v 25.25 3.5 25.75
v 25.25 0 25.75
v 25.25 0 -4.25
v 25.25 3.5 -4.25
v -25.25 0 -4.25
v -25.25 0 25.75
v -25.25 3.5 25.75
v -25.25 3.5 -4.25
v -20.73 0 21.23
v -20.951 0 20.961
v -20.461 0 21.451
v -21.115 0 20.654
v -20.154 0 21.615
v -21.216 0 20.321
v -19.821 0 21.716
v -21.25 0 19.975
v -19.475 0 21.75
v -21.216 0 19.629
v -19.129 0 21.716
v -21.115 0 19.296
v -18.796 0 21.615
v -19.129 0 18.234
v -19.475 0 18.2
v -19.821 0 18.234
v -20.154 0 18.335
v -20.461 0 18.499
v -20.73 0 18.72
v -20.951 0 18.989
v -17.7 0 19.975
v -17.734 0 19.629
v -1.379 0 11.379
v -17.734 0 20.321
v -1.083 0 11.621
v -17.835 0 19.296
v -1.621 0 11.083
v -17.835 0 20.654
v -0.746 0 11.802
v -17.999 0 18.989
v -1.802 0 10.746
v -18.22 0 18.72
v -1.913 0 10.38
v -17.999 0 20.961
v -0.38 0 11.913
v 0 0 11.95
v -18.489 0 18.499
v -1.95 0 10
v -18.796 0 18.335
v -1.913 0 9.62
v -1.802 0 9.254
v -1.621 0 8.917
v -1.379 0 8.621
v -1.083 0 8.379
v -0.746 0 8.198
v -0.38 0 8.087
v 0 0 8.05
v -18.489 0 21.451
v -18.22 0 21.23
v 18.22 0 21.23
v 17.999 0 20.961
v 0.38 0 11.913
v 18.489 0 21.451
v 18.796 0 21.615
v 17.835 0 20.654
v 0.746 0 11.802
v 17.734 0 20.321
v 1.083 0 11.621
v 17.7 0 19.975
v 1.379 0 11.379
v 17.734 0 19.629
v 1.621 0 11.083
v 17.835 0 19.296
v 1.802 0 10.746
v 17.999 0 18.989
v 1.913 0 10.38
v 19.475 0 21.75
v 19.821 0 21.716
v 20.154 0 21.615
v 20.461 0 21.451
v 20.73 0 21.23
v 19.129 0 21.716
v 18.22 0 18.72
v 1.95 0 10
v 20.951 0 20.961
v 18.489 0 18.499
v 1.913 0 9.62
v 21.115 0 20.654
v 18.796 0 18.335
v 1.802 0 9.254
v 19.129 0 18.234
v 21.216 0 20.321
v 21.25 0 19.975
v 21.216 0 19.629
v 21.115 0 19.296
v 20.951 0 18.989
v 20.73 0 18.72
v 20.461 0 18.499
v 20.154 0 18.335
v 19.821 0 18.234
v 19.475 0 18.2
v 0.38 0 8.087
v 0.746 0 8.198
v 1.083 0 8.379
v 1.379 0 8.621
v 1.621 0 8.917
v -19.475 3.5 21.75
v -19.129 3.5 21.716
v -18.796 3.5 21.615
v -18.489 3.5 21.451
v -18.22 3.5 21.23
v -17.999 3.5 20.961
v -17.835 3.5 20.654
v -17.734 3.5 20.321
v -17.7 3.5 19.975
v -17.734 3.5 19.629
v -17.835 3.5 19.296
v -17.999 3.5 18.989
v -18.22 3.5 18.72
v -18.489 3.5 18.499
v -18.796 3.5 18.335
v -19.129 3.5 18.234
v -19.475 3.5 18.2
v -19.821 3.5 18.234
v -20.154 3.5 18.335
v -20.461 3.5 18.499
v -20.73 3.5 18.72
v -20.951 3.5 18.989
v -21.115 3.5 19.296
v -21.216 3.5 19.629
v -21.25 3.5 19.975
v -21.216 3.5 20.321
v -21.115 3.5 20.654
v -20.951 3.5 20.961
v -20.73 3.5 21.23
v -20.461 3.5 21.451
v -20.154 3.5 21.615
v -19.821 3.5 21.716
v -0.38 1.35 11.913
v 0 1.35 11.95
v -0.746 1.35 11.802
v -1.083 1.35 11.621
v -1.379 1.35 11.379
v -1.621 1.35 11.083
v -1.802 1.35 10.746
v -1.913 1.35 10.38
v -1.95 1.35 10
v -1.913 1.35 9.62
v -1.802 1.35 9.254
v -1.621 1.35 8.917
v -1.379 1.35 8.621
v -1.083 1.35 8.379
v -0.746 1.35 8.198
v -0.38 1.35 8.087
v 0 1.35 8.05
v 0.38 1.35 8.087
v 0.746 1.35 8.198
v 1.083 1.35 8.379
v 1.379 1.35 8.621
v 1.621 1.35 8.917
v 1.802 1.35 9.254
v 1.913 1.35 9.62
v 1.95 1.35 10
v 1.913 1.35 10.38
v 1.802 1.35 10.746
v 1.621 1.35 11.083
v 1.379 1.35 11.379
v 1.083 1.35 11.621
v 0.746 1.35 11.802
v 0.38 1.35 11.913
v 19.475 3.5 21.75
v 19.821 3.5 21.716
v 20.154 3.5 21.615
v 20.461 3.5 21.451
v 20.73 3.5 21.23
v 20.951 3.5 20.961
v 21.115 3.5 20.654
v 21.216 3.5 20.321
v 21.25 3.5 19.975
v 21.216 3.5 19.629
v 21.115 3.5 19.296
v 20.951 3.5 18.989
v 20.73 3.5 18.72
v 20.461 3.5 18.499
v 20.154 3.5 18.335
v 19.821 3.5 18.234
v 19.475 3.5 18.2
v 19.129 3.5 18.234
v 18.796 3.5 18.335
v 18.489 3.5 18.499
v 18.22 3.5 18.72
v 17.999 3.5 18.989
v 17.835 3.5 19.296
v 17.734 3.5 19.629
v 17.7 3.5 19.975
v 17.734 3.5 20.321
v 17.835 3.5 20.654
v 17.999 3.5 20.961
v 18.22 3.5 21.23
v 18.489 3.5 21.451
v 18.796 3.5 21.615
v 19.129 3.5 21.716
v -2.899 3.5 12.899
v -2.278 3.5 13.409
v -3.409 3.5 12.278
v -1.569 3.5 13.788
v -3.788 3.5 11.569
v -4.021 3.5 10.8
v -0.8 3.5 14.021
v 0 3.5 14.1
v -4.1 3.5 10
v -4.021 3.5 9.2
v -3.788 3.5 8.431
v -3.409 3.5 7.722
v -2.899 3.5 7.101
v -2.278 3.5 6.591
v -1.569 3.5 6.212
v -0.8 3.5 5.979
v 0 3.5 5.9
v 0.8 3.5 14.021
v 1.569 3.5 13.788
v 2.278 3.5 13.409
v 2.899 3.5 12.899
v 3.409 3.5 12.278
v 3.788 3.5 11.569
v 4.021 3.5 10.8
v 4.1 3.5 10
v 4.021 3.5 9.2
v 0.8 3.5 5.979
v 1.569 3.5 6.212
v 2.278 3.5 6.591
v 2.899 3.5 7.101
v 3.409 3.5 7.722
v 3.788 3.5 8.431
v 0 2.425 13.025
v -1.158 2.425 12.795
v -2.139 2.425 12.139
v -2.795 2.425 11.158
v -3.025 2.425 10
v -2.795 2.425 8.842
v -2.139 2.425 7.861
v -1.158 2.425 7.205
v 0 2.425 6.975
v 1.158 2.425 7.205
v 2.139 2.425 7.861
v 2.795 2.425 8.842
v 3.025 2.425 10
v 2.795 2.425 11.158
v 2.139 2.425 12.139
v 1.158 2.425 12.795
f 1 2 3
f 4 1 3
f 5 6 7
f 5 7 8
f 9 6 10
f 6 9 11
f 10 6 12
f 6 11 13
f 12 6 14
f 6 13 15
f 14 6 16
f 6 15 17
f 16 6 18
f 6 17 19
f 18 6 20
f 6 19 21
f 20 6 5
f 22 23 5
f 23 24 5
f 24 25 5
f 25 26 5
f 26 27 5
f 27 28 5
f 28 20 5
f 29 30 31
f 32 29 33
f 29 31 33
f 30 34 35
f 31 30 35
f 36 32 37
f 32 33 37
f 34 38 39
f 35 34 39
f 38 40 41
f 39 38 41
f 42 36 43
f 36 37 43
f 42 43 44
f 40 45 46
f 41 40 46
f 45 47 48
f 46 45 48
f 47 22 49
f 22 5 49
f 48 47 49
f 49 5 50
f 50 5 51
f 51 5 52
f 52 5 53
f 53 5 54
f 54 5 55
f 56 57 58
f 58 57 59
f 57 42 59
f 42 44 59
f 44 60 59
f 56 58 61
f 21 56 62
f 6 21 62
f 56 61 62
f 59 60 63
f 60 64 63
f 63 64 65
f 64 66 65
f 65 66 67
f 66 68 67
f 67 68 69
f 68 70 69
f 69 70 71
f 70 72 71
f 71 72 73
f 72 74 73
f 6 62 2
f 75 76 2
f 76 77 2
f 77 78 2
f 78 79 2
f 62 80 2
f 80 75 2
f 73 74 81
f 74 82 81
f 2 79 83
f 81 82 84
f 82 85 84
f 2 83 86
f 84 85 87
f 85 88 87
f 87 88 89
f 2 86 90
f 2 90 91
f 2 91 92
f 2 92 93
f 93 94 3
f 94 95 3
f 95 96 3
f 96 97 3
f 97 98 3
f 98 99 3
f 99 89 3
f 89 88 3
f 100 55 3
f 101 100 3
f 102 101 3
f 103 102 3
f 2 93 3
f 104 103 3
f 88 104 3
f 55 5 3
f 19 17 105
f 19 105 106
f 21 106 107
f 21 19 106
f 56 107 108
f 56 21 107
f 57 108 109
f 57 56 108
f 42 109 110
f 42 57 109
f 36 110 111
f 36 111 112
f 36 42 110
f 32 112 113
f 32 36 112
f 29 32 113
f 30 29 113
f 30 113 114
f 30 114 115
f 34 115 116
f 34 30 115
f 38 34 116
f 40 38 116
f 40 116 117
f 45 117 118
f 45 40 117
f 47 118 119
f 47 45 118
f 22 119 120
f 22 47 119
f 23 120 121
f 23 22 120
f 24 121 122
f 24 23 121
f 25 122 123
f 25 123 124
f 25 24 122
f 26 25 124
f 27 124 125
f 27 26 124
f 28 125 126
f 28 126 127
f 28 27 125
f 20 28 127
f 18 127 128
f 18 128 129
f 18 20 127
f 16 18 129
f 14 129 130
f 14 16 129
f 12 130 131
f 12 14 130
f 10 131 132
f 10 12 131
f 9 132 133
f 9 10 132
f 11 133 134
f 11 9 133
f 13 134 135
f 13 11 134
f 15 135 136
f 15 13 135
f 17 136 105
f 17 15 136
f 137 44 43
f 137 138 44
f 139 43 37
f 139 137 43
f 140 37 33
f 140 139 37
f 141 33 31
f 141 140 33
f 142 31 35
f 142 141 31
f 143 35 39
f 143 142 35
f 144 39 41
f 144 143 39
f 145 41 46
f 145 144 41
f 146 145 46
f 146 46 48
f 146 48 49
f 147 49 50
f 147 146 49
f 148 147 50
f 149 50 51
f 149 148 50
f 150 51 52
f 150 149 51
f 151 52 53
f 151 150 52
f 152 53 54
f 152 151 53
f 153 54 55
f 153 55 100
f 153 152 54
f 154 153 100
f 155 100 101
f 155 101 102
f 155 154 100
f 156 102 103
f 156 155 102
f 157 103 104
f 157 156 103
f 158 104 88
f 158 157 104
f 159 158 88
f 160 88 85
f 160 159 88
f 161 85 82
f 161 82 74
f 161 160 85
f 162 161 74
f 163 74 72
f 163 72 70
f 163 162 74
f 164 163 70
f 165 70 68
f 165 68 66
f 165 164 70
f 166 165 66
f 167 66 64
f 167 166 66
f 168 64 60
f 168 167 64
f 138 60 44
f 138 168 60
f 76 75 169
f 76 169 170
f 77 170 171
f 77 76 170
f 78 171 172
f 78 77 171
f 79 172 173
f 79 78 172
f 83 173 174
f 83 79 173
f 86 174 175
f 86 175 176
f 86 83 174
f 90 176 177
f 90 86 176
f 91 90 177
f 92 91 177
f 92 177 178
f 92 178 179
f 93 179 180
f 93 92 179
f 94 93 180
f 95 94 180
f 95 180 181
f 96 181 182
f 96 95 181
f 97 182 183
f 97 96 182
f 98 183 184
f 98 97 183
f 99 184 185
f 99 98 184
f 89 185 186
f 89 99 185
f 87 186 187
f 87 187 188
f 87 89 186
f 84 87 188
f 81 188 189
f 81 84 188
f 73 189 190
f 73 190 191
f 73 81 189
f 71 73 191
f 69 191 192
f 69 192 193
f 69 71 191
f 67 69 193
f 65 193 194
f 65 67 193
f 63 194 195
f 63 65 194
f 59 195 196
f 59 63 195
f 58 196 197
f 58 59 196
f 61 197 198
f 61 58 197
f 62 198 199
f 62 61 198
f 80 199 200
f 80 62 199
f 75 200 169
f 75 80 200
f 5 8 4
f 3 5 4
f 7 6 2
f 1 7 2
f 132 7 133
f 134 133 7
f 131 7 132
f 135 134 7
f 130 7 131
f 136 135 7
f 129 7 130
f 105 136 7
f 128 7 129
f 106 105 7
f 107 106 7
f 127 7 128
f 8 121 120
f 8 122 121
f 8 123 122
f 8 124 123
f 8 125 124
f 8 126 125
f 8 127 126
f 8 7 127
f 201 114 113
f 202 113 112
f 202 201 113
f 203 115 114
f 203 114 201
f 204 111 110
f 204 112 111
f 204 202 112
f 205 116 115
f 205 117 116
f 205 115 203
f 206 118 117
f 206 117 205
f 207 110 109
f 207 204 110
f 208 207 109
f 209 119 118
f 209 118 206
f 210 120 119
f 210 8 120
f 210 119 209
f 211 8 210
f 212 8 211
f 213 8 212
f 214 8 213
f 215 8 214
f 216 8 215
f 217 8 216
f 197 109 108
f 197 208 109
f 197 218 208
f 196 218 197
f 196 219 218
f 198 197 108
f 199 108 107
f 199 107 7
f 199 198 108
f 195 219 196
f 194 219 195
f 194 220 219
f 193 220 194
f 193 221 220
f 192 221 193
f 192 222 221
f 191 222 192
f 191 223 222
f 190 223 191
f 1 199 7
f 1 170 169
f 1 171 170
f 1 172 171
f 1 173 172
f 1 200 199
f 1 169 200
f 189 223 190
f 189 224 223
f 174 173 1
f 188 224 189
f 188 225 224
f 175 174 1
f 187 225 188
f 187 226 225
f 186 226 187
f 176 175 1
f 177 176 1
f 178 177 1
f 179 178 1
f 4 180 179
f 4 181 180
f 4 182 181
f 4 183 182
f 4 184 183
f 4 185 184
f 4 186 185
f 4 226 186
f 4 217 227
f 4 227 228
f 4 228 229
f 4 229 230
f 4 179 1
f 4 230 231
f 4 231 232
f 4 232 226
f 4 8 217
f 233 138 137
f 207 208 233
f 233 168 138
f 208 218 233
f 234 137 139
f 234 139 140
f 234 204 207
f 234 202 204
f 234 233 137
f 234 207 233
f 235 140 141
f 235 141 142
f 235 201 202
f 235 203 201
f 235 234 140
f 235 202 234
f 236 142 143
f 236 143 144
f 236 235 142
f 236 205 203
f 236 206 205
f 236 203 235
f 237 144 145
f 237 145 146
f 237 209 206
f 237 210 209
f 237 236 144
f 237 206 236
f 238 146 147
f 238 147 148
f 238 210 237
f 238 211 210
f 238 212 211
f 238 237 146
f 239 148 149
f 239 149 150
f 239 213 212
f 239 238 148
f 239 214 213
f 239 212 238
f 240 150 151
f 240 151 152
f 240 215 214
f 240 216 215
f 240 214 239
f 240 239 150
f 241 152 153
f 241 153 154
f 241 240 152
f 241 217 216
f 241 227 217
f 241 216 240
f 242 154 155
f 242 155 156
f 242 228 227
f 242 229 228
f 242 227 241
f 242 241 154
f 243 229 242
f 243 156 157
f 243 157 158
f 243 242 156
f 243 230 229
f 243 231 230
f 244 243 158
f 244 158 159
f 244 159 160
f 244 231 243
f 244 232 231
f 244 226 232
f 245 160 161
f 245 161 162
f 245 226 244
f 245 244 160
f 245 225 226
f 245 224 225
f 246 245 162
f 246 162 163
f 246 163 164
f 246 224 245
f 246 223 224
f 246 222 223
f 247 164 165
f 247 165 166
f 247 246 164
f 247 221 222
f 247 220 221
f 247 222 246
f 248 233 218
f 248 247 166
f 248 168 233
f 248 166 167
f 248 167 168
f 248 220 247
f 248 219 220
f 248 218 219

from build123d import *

# Parameters (mm, degrees)
SKETCH1_W                                      = 50.5
SKETCH1_H                                      = 51.5
SKETCH1_R                                      = 1.775
BOSS_EXTRUDE1_DEPTH                            = 3.5
CSK_FOR_M3_5_FLAT_HEAD_MACHINE_SCREW1_AT_COUNT = 2
CSK_FOR_M3_5_FLAT_HEAD_MACHINE_SCREW1_AT_PITCH = 20


with BuildPart() as part:
    # Sketch1 → Boss-Extrude1 (new body)
    with BuildSketch(Plane(origin=(0, 0, 0), x_dir=(1, 0, 0), z_dir=(0, 1, 0))):
        Rectangle(SKETCH1_W, SKETCH1_H)
        with Locations(Location((-19.475, 19.975, 0), (0, 0, 270))):
            Circle(SKETCH1_R, mode=Mode.SUBTRACT)
        with Locations(Location((19.475, 19.975, 0), (0, 0, 270))):
            Circle(SKETCH1_R, mode=Mode.SUBTRACT)
        with Locations(Location((19.475, -19.975, 0), (0, 0, 270))):
            Circle(SKETCH1_R, mode=Mode.SUBTRACT)
        with Locations(Location((-19.475, -19.975, 0), (0, 0, 270))):
            Circle(SKETCH1_R, mode=Mode.SUBTRACT)
    extrude(amount=BOSS_EXTRUDE1_DEPTH)

    # Sketch4 → CSK for M3.5 Flat Head Machine Screw1 (revolve, cut)
    with BuildSketch(Plane(origin=(0, 3.5, -10), x_dir=(0, 0, 1), z_dir=(1, 0, 0))):
        Polygon((0, 0), (0, 3.5), (1.95, 3.5), (1.95, 2.15), (4.1, 0), align=None)
    csk_for_m3_5_flat_head_machine_screw1 = revolve(axis=Axis((0, 9.85, -10), (0, -1, 0)), mode=Mode.SUBTRACT)

    # CSK for M3.5 Flat Head Machine Screw1 at: CSK for M3.5 Flat Head Machine Screw1 ×2
    with Locations(*[(0, 0, i * CSK_FOR_M3_5_FLAT_HEAD_MACHINE_SCREW1_AT_PITCH) for i in range(1, CSK_FOR_M3_5_FLAT_HEAD_MACHINE_SCREW1_AT_COUNT)]):
        add(csk_for_m3_5_flat_head_machine_screw1, mode=Mode.SUBTRACT)

    # Split1
    split(bisect_by=Plane.XY.offset(-4.25), keep=Keep.TOP)


solid = part.part
